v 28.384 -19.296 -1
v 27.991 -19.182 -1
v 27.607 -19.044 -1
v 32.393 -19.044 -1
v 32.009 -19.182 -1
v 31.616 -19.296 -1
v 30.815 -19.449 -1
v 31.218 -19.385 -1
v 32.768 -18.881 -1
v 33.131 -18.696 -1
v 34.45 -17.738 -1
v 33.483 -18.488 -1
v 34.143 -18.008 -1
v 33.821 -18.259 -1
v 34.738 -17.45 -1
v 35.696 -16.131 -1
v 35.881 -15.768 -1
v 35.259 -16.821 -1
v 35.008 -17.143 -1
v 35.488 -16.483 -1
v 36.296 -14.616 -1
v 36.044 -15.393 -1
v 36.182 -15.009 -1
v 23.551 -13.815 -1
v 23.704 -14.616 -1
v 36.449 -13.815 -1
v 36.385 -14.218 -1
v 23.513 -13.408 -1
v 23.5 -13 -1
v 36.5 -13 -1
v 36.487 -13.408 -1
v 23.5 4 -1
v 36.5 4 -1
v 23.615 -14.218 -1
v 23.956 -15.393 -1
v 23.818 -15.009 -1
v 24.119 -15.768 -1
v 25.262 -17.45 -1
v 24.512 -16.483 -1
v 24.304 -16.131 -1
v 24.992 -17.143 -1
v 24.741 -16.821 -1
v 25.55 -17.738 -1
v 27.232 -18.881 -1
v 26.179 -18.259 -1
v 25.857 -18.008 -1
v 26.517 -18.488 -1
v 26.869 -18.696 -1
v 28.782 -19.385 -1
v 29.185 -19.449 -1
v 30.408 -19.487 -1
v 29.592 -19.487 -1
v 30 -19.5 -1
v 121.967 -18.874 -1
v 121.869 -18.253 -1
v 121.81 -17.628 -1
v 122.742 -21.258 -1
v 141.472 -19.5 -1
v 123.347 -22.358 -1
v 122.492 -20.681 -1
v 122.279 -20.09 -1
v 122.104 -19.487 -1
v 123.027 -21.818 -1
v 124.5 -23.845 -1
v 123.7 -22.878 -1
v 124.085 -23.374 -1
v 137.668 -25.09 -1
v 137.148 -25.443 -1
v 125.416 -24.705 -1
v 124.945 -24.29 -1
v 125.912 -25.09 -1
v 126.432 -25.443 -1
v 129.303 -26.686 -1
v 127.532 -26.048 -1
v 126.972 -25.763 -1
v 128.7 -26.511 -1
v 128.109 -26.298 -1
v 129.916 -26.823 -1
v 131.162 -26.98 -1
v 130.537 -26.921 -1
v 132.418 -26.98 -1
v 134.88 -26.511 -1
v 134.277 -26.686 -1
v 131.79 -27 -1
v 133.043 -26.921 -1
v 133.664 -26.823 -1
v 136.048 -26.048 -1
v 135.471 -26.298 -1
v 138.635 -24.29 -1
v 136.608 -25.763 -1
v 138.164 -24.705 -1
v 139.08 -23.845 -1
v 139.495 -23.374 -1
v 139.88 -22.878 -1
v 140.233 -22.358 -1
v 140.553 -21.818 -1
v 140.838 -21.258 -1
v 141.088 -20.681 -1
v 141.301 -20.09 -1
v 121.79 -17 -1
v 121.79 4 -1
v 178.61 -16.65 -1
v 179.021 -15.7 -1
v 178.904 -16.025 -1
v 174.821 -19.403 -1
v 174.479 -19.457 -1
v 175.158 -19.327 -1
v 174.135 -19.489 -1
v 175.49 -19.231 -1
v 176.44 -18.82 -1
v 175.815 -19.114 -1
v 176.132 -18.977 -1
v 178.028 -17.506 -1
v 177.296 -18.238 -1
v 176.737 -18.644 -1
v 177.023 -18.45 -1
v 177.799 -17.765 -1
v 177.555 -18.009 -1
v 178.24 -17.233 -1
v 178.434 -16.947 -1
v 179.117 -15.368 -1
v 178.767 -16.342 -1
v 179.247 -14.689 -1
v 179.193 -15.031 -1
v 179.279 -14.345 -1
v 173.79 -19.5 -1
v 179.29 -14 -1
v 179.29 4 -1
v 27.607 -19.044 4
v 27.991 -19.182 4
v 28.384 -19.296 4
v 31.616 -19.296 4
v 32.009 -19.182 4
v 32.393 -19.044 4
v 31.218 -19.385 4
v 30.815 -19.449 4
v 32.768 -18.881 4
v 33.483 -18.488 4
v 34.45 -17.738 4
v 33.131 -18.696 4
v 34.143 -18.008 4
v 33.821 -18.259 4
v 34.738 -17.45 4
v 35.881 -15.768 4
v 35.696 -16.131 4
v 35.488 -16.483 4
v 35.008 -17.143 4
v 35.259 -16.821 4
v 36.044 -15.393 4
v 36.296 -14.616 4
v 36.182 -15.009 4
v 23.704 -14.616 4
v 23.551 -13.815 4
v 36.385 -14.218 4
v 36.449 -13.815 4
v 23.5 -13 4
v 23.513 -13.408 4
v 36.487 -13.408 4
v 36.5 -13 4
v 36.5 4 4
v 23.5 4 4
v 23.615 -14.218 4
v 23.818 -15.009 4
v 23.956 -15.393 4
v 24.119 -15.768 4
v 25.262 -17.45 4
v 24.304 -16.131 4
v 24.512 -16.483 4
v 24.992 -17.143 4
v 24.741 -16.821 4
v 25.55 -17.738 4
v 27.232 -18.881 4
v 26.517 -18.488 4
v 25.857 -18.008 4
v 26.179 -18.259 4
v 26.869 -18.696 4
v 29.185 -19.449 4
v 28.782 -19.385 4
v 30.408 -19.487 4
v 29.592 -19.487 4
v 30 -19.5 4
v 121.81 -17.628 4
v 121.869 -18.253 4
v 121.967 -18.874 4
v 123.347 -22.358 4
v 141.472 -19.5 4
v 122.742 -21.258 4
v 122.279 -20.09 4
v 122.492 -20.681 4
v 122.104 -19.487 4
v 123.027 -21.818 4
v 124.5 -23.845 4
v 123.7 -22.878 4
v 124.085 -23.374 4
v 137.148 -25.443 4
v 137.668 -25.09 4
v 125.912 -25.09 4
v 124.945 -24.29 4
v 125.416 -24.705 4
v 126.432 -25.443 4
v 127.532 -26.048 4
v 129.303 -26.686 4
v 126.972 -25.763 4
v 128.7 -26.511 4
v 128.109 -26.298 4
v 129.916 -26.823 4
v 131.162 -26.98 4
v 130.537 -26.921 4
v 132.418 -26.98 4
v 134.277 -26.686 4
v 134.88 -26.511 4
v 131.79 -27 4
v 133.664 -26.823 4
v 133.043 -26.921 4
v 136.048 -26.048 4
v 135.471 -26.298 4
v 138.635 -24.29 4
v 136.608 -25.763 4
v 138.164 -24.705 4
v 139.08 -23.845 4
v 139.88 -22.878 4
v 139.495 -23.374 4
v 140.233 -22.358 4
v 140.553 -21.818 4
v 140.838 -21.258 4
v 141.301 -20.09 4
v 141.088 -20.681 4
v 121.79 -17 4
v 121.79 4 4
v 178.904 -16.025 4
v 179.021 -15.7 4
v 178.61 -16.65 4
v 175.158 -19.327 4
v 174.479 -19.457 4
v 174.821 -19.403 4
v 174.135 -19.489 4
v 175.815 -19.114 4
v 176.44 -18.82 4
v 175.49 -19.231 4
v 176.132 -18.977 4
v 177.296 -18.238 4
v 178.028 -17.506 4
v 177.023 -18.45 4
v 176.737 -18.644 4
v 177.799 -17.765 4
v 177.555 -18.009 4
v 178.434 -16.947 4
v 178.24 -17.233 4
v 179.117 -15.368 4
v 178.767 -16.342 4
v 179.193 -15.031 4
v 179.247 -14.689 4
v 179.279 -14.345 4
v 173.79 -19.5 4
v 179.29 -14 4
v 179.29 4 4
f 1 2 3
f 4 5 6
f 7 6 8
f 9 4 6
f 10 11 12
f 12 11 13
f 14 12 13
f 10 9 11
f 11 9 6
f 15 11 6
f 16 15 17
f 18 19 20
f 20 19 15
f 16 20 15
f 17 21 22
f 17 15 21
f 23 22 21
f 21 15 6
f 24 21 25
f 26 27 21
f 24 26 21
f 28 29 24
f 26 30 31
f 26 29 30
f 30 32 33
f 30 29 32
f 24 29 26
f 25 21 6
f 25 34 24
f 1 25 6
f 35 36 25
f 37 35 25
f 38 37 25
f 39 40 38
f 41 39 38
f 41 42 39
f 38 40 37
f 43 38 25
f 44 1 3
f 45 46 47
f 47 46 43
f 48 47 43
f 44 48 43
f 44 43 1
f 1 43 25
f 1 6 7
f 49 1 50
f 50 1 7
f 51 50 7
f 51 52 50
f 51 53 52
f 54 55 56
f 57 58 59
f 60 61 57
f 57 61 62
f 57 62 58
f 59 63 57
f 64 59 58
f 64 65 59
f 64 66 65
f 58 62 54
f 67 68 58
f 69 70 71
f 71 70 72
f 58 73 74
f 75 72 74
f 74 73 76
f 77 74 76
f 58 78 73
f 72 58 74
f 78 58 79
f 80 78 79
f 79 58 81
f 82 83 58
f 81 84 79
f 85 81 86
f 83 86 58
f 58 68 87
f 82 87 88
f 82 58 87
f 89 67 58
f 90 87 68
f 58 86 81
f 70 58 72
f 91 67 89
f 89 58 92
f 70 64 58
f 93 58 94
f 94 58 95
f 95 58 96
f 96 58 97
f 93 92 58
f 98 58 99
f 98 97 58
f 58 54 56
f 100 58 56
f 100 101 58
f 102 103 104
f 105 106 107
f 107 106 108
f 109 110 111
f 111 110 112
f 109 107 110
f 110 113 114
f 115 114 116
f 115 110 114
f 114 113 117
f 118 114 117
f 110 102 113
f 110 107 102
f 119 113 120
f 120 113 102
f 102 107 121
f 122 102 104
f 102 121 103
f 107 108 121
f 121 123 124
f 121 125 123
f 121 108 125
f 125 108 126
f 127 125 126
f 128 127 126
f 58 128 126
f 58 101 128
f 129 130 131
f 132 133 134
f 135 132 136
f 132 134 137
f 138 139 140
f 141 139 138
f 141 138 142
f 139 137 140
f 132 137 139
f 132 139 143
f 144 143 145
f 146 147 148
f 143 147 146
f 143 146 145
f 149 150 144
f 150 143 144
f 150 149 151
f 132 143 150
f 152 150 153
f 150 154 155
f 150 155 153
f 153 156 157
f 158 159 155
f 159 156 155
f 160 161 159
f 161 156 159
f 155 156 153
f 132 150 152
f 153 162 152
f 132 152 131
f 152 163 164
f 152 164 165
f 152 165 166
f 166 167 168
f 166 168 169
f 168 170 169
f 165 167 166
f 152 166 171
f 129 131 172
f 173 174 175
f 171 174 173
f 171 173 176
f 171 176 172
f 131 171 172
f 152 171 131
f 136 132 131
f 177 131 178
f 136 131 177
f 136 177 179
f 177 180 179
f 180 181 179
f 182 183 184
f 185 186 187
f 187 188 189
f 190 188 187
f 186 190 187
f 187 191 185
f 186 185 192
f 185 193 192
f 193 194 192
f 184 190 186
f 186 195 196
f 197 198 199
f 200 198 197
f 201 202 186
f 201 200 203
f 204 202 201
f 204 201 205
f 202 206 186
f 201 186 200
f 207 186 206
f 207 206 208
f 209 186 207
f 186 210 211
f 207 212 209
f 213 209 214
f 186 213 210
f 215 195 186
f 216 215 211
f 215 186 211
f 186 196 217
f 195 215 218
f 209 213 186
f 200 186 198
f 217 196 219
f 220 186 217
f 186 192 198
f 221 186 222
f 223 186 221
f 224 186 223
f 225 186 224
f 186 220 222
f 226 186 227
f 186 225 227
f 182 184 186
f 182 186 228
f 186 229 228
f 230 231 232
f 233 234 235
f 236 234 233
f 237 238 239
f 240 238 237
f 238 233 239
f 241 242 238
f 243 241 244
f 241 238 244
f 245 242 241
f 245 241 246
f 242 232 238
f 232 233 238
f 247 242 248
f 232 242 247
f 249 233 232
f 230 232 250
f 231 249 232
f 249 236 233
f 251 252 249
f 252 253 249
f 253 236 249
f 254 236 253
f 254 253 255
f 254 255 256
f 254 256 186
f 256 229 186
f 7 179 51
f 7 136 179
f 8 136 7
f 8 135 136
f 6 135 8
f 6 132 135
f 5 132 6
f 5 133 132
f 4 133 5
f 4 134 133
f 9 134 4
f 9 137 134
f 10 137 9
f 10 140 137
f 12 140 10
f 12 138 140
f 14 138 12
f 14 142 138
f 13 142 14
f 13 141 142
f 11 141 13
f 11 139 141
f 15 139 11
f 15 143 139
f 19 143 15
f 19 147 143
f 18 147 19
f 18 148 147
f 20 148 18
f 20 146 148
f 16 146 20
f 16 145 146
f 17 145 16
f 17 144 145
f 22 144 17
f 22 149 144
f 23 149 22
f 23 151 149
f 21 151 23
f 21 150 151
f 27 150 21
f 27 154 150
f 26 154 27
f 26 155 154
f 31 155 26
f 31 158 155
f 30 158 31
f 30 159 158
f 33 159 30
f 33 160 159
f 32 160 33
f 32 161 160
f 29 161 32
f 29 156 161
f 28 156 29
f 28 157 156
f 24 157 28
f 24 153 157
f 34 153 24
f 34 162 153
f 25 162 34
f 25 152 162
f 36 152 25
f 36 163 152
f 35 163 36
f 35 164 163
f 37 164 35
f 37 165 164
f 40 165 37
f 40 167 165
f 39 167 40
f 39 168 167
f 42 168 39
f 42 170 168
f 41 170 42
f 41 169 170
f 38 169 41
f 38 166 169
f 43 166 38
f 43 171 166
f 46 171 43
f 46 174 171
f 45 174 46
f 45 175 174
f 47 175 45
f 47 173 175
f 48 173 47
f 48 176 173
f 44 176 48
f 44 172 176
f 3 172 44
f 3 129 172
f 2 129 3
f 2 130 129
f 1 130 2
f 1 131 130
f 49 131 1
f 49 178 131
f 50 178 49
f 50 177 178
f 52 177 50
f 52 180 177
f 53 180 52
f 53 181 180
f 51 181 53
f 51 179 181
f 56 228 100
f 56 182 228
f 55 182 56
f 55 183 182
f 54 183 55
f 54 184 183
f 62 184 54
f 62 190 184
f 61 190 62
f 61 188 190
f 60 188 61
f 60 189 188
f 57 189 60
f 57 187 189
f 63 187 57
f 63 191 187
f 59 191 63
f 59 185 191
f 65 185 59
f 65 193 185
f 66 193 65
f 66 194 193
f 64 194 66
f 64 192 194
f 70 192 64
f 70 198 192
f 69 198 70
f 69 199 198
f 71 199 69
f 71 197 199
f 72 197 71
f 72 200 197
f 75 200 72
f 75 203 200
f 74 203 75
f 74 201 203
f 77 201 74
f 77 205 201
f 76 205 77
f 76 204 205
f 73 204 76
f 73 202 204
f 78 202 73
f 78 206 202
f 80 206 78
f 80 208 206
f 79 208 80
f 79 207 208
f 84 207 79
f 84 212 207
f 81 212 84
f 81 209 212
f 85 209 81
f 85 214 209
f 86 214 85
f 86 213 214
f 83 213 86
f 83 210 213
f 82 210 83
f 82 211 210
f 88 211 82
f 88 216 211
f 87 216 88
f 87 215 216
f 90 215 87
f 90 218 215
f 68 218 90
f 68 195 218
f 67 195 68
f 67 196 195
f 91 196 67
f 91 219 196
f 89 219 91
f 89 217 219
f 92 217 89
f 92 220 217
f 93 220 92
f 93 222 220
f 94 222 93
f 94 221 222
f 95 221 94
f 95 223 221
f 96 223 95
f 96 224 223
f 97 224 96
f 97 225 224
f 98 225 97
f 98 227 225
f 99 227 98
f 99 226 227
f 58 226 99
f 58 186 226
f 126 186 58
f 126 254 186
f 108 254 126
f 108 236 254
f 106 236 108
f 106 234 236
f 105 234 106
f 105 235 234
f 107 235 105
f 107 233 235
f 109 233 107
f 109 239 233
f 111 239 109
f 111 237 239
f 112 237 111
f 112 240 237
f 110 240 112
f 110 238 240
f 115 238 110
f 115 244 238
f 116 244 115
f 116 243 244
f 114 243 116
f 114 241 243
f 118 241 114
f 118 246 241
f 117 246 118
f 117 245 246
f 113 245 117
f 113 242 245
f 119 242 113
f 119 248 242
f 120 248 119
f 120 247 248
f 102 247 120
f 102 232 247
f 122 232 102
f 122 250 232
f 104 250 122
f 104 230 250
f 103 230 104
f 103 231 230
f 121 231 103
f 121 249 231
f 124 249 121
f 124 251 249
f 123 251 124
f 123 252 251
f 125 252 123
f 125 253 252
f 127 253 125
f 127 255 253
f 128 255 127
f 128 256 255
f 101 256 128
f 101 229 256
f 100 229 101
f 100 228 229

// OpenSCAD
// file: ../case_settings.scad
// ############### SETTINGS #################

// CHOOSE YOUR FLAVOR:
// 0: one size fits all
// 1: beats
// 2: bass
// 3: keys
// 4: sample
unit = 4;
// 5: fm
// 6: kick

// leave holes in the lid for power, MIDI and audio jacks? (so that the lid can be put on without having to unplug everything)
cutouts_for_io_jacks = true;

// create holes for magnets which hold the lid in place?
//cutouts_for_magnetic_lid = false;

// magnet dimensions in millimeters - magnet_xlen is assumed to be equal to the shell thickness, i.e. use 5mm wide magnets if you set thickness to 5mm
//magnet_ylen = 5;
//magnet_zlen = 2;

// safety distance between jacks and case in millimeters - increase this if you use cables with bulky plugs
jack_r_padding = 1.5;

// sheet thickness in millimeters (5mm max due to the MIDI jack and neighboring potis; maybe 6mm if you own a MIDI cable with a very slim plug)
thickness = 3;

// laser kerf compensation in millimeters
lkerf = 0.05; // 3mm PMMA in Epilog Zing with 25% speed, 50% power, 5000Hz laser

// separation of parts in 2D in millimeters
lmargin = 2;
// file: ../volca_dimensions.scad
// ######### KORG VOLCA DIMENSIONS ##########

xlen = 193;
ylen = 115;
zlen = 29; // bottom to bezel

// TODO measured from a modified device!
rubber_feet_zlen = 2;

// for the area between the two panel screws: clearance on the x axis between the device edge and the closest poti
bezel_side_clearance_x = 8;

midi_jack_x = 62; // measured from the right (xmax)
midi_jack_y = 17; // measured from the back (ymax)
midi_jack_r = 8.5;

audio_jacks_x = 20; // measured from the right (xmax)
audio_jacks_y = 14; // measured from the back (ymax)
audio_jacks_spacing_x = 12;
audio_jacks_r = 4;

power_jack_x = 30; // measured from the left (xmin)
power_jack_y = 13; // measured from the back (ymax)
power_jack_r = 5;

power_button_zlen = 1;

panel_screw_zlen = 3;
panel_screw_r = 2.5;
panel_screw_x = 4 + panel_screw_r; // measured from either side (xmin, xmax)
panel_screw_back_y = 5 + panel_screw_r; // measured from the back (ymax)

small_poti_zlen = 10;
medium_poti_zlen = 15;  // bass/treble poti on sample
large_poti_zlen = 18; // cutoff poti on bass (TODO educated guess!)

onerow_ribbon_ylen = 40;
tworow_ribbon_ylen = 55; // TODO educated guess!


// #### DIMENSIONS DEPENDING ON THE UNIT ####

// order applying to all lists:
// 0: one size fits all
// 1: beats
// 2: bass
// 3: keys
// 4: sample
// 5: fm
// 6: kick
names_by_unit = ["one_size_fits_all", "beats", "bass", "keys", "sample", "fm", "kick"];
max_poti_zlen_by_unit = [large_poti_zlen, medium_poti_zlen, large_poti_zlen, medium_poti_zlen, medium_poti_zlen, small_poti_zlen, large_poti_zlen];
ribbon_ylen_by_unit = [onerow_ribbon_ylen, onerow_ribbon_ylen, onerow_ribbon_ylen, tworow_ribbon_ylen, onerow_ribbon_ylen, tworow_ribbon_ylen, onerow_ribbon_ylen];
// if the area between the power and the MIDI jack is free
free_back_by_unit = [false, true, false, false, true, false, false];

unit = -1;
name = names_by_unit[unit];
max_poti_zlen = max_poti_zlen_by_unit[unit];
ribbon_ylen = ribbon_ylen_by_unit[unit];
is_back_free = free_back_by_unit[unit];
// file: ../case_dimensions.scad
include <volca_dimensions.scad>
include <case_settings.scad>


// ############# CASE SETTINGS #############

$fn = 100;
t = thickness;

// extra bit of air between case and volca unit - 0.79 instead of 0.80 because lasercut is buggy with 0.8 and doesn't create all fingers on some parts
tol = 0.79;

// x and y lengths of a volca unit, including tolerance
x = xlen + tol;
y = ylen + tol;

// space between tallest poti and the shell on top
poti_safety_zlen = 4;

// space between the aluminium bezel and the closest part of the shell above it
bezel_safety_zlen = panel_screw_zlen + tol;

// safety pin stuff
safety_pin_inner_xlen = bezel_side_clearance_x - t - 1; // 1 is some arbitrary extra distance to ensure the pin can be inserted/removed
safety_pin_ylen = 12;
safety_pin_center_y = ribbon_ylen + 2*(panel_screw_r) + 9; // place the pin behind the panel screw located behind the ribbon keyboard (9mm is half of the distance between panel screw and the nearest knob on all current volcas (except fm where it doesn't matter))
safety_pin_z = 1; // 1mm above the bezel

// case wave stuff
case_wave_deg = 540; // three bumps
case_wave_amplitude = safety_pin_z + 2.75*t;
case_wave_wave_length = ylen+tol;
case_wave_k = get_case_wave_k(ylen+tol, safety_pin_center_y);

// center of magnet for bottom and lid sides
//magnet_zy = get_case_wave_pos(case_wave_amplitude, case_wave_wave_length, case_wave_k, 90);
// magnet distance from wave valley in z direction
//magnet_spacing_z = t+0.5*magnet_zlen;

// finger radius for finger hole(s)
finger_radius = 11;

// ##########################################

// exponent k is chosen so that the 270° bump coincides with the fixpoint
function get_case_wave_k(wave_length, fixpoint_y) = (log(fixpoint_y) - log(wave_length)) / log(270/case_wave_deg);

function get_case_wave_pos(a, l, k, deg) = [-a*sin(deg), l*pow(deg/case_wave_deg, k)];

module case_wave(positive_part) {
    intersection() {
        if (positive_part) {
            square([case_wave_amplitude, case_wave_wave_length]);
        } else {
            translate([-case_wave_amplitude,0,0])
                square([case_wave_amplitude, case_wave_wave_length]);
        }
        
        a = case_wave_amplitude;
        l = case_wave_wave_length;
        k = case_wave_k;
        deg = case_wave_deg;
        rotate([0,0,90])
            polygon([for (i = [0:$fn]) [l*pow(i/$fn, k), a*sin(deg*i/$fn)]]); 
    }
}
// file: lid_dimensions.scad
include <../case_dimensions.scad>

// height of the lid from the bezel top to the top inside the lid
lid_z = max_poti_zlen + poti_safety_zlen;

// ylen of the part covering the io jacks
lid_bezel_io_cover_y = midi_jack_y + midi_jack_r + jack_r_padding;

// ylen of the raised part above the keyboard and potis (-t because of the vertical lid_back part)
lid_top_y = y - lid_bezel_io_cover_y - t;

// zlen of the vertical back part between potis and io jacks
lid_back_z = lid_z - bezel_safety_zlen - t;

// dimensions of the two corners missing from the back of the top lid
power_jack_corner_dims = [power_jack_x, power_jack_y] + (power_jack_r + jack_r_padding)*[1,1];
audio_jack_corner_dims = [midi_jack_x, midi_jack_y] + (midi_jack_r + jack_r_padding)*[1,1];
// main file
include <lid_dimensions.scad>

module _io_cutouts_2d() {
    dif = 1;

    // power jack
    translate([power_jack_x, -power_jack_y])
        _io_milled_2d(power_jack_y+dif, power_jack_r);

    // midi jack
    translate([x,0] - [midi_jack_x, midi_jack_y])
        _io_milled_2d(midi_jack_y+dif, midi_jack_r);

    // audio jacks
    hull() {
        translate([0,-audio_jacks_y]) {
            for(xi=[0,1,2]) {
                translate([x,0] - [audio_jacks_x + xi*audio_jacks_spacing_x, 0])
                    _io_milled_2d(audio_jacks_y+dif, audio_jacks_r);
            }
        }
            // put a fourth one in the position of the midi jack: this way, the thin bridge between the midi jack cutout and the leftmost audio jack cutout vanishes            
        translate([x,0] - [midi_jack_x, audio_jacks_y])
            _io_milled_2d(audio_jacks_y+dif, audio_jacks_r);
    }
}

module _io_milled_2d(mill_y, r) {
    r_pad = r + jack_r_padding;
    circle(r=r_pad);
    translate([-r_pad,0])
        square(r_pad*[2,0] + [0, mill_y + t]);
}

module io_cutouts() {    
    dif=1;
    translate([0,0,-dif])
        linear_extrude(height=t+2*dif)
            _io_cutouts_2d();
}

io_cutouts();
